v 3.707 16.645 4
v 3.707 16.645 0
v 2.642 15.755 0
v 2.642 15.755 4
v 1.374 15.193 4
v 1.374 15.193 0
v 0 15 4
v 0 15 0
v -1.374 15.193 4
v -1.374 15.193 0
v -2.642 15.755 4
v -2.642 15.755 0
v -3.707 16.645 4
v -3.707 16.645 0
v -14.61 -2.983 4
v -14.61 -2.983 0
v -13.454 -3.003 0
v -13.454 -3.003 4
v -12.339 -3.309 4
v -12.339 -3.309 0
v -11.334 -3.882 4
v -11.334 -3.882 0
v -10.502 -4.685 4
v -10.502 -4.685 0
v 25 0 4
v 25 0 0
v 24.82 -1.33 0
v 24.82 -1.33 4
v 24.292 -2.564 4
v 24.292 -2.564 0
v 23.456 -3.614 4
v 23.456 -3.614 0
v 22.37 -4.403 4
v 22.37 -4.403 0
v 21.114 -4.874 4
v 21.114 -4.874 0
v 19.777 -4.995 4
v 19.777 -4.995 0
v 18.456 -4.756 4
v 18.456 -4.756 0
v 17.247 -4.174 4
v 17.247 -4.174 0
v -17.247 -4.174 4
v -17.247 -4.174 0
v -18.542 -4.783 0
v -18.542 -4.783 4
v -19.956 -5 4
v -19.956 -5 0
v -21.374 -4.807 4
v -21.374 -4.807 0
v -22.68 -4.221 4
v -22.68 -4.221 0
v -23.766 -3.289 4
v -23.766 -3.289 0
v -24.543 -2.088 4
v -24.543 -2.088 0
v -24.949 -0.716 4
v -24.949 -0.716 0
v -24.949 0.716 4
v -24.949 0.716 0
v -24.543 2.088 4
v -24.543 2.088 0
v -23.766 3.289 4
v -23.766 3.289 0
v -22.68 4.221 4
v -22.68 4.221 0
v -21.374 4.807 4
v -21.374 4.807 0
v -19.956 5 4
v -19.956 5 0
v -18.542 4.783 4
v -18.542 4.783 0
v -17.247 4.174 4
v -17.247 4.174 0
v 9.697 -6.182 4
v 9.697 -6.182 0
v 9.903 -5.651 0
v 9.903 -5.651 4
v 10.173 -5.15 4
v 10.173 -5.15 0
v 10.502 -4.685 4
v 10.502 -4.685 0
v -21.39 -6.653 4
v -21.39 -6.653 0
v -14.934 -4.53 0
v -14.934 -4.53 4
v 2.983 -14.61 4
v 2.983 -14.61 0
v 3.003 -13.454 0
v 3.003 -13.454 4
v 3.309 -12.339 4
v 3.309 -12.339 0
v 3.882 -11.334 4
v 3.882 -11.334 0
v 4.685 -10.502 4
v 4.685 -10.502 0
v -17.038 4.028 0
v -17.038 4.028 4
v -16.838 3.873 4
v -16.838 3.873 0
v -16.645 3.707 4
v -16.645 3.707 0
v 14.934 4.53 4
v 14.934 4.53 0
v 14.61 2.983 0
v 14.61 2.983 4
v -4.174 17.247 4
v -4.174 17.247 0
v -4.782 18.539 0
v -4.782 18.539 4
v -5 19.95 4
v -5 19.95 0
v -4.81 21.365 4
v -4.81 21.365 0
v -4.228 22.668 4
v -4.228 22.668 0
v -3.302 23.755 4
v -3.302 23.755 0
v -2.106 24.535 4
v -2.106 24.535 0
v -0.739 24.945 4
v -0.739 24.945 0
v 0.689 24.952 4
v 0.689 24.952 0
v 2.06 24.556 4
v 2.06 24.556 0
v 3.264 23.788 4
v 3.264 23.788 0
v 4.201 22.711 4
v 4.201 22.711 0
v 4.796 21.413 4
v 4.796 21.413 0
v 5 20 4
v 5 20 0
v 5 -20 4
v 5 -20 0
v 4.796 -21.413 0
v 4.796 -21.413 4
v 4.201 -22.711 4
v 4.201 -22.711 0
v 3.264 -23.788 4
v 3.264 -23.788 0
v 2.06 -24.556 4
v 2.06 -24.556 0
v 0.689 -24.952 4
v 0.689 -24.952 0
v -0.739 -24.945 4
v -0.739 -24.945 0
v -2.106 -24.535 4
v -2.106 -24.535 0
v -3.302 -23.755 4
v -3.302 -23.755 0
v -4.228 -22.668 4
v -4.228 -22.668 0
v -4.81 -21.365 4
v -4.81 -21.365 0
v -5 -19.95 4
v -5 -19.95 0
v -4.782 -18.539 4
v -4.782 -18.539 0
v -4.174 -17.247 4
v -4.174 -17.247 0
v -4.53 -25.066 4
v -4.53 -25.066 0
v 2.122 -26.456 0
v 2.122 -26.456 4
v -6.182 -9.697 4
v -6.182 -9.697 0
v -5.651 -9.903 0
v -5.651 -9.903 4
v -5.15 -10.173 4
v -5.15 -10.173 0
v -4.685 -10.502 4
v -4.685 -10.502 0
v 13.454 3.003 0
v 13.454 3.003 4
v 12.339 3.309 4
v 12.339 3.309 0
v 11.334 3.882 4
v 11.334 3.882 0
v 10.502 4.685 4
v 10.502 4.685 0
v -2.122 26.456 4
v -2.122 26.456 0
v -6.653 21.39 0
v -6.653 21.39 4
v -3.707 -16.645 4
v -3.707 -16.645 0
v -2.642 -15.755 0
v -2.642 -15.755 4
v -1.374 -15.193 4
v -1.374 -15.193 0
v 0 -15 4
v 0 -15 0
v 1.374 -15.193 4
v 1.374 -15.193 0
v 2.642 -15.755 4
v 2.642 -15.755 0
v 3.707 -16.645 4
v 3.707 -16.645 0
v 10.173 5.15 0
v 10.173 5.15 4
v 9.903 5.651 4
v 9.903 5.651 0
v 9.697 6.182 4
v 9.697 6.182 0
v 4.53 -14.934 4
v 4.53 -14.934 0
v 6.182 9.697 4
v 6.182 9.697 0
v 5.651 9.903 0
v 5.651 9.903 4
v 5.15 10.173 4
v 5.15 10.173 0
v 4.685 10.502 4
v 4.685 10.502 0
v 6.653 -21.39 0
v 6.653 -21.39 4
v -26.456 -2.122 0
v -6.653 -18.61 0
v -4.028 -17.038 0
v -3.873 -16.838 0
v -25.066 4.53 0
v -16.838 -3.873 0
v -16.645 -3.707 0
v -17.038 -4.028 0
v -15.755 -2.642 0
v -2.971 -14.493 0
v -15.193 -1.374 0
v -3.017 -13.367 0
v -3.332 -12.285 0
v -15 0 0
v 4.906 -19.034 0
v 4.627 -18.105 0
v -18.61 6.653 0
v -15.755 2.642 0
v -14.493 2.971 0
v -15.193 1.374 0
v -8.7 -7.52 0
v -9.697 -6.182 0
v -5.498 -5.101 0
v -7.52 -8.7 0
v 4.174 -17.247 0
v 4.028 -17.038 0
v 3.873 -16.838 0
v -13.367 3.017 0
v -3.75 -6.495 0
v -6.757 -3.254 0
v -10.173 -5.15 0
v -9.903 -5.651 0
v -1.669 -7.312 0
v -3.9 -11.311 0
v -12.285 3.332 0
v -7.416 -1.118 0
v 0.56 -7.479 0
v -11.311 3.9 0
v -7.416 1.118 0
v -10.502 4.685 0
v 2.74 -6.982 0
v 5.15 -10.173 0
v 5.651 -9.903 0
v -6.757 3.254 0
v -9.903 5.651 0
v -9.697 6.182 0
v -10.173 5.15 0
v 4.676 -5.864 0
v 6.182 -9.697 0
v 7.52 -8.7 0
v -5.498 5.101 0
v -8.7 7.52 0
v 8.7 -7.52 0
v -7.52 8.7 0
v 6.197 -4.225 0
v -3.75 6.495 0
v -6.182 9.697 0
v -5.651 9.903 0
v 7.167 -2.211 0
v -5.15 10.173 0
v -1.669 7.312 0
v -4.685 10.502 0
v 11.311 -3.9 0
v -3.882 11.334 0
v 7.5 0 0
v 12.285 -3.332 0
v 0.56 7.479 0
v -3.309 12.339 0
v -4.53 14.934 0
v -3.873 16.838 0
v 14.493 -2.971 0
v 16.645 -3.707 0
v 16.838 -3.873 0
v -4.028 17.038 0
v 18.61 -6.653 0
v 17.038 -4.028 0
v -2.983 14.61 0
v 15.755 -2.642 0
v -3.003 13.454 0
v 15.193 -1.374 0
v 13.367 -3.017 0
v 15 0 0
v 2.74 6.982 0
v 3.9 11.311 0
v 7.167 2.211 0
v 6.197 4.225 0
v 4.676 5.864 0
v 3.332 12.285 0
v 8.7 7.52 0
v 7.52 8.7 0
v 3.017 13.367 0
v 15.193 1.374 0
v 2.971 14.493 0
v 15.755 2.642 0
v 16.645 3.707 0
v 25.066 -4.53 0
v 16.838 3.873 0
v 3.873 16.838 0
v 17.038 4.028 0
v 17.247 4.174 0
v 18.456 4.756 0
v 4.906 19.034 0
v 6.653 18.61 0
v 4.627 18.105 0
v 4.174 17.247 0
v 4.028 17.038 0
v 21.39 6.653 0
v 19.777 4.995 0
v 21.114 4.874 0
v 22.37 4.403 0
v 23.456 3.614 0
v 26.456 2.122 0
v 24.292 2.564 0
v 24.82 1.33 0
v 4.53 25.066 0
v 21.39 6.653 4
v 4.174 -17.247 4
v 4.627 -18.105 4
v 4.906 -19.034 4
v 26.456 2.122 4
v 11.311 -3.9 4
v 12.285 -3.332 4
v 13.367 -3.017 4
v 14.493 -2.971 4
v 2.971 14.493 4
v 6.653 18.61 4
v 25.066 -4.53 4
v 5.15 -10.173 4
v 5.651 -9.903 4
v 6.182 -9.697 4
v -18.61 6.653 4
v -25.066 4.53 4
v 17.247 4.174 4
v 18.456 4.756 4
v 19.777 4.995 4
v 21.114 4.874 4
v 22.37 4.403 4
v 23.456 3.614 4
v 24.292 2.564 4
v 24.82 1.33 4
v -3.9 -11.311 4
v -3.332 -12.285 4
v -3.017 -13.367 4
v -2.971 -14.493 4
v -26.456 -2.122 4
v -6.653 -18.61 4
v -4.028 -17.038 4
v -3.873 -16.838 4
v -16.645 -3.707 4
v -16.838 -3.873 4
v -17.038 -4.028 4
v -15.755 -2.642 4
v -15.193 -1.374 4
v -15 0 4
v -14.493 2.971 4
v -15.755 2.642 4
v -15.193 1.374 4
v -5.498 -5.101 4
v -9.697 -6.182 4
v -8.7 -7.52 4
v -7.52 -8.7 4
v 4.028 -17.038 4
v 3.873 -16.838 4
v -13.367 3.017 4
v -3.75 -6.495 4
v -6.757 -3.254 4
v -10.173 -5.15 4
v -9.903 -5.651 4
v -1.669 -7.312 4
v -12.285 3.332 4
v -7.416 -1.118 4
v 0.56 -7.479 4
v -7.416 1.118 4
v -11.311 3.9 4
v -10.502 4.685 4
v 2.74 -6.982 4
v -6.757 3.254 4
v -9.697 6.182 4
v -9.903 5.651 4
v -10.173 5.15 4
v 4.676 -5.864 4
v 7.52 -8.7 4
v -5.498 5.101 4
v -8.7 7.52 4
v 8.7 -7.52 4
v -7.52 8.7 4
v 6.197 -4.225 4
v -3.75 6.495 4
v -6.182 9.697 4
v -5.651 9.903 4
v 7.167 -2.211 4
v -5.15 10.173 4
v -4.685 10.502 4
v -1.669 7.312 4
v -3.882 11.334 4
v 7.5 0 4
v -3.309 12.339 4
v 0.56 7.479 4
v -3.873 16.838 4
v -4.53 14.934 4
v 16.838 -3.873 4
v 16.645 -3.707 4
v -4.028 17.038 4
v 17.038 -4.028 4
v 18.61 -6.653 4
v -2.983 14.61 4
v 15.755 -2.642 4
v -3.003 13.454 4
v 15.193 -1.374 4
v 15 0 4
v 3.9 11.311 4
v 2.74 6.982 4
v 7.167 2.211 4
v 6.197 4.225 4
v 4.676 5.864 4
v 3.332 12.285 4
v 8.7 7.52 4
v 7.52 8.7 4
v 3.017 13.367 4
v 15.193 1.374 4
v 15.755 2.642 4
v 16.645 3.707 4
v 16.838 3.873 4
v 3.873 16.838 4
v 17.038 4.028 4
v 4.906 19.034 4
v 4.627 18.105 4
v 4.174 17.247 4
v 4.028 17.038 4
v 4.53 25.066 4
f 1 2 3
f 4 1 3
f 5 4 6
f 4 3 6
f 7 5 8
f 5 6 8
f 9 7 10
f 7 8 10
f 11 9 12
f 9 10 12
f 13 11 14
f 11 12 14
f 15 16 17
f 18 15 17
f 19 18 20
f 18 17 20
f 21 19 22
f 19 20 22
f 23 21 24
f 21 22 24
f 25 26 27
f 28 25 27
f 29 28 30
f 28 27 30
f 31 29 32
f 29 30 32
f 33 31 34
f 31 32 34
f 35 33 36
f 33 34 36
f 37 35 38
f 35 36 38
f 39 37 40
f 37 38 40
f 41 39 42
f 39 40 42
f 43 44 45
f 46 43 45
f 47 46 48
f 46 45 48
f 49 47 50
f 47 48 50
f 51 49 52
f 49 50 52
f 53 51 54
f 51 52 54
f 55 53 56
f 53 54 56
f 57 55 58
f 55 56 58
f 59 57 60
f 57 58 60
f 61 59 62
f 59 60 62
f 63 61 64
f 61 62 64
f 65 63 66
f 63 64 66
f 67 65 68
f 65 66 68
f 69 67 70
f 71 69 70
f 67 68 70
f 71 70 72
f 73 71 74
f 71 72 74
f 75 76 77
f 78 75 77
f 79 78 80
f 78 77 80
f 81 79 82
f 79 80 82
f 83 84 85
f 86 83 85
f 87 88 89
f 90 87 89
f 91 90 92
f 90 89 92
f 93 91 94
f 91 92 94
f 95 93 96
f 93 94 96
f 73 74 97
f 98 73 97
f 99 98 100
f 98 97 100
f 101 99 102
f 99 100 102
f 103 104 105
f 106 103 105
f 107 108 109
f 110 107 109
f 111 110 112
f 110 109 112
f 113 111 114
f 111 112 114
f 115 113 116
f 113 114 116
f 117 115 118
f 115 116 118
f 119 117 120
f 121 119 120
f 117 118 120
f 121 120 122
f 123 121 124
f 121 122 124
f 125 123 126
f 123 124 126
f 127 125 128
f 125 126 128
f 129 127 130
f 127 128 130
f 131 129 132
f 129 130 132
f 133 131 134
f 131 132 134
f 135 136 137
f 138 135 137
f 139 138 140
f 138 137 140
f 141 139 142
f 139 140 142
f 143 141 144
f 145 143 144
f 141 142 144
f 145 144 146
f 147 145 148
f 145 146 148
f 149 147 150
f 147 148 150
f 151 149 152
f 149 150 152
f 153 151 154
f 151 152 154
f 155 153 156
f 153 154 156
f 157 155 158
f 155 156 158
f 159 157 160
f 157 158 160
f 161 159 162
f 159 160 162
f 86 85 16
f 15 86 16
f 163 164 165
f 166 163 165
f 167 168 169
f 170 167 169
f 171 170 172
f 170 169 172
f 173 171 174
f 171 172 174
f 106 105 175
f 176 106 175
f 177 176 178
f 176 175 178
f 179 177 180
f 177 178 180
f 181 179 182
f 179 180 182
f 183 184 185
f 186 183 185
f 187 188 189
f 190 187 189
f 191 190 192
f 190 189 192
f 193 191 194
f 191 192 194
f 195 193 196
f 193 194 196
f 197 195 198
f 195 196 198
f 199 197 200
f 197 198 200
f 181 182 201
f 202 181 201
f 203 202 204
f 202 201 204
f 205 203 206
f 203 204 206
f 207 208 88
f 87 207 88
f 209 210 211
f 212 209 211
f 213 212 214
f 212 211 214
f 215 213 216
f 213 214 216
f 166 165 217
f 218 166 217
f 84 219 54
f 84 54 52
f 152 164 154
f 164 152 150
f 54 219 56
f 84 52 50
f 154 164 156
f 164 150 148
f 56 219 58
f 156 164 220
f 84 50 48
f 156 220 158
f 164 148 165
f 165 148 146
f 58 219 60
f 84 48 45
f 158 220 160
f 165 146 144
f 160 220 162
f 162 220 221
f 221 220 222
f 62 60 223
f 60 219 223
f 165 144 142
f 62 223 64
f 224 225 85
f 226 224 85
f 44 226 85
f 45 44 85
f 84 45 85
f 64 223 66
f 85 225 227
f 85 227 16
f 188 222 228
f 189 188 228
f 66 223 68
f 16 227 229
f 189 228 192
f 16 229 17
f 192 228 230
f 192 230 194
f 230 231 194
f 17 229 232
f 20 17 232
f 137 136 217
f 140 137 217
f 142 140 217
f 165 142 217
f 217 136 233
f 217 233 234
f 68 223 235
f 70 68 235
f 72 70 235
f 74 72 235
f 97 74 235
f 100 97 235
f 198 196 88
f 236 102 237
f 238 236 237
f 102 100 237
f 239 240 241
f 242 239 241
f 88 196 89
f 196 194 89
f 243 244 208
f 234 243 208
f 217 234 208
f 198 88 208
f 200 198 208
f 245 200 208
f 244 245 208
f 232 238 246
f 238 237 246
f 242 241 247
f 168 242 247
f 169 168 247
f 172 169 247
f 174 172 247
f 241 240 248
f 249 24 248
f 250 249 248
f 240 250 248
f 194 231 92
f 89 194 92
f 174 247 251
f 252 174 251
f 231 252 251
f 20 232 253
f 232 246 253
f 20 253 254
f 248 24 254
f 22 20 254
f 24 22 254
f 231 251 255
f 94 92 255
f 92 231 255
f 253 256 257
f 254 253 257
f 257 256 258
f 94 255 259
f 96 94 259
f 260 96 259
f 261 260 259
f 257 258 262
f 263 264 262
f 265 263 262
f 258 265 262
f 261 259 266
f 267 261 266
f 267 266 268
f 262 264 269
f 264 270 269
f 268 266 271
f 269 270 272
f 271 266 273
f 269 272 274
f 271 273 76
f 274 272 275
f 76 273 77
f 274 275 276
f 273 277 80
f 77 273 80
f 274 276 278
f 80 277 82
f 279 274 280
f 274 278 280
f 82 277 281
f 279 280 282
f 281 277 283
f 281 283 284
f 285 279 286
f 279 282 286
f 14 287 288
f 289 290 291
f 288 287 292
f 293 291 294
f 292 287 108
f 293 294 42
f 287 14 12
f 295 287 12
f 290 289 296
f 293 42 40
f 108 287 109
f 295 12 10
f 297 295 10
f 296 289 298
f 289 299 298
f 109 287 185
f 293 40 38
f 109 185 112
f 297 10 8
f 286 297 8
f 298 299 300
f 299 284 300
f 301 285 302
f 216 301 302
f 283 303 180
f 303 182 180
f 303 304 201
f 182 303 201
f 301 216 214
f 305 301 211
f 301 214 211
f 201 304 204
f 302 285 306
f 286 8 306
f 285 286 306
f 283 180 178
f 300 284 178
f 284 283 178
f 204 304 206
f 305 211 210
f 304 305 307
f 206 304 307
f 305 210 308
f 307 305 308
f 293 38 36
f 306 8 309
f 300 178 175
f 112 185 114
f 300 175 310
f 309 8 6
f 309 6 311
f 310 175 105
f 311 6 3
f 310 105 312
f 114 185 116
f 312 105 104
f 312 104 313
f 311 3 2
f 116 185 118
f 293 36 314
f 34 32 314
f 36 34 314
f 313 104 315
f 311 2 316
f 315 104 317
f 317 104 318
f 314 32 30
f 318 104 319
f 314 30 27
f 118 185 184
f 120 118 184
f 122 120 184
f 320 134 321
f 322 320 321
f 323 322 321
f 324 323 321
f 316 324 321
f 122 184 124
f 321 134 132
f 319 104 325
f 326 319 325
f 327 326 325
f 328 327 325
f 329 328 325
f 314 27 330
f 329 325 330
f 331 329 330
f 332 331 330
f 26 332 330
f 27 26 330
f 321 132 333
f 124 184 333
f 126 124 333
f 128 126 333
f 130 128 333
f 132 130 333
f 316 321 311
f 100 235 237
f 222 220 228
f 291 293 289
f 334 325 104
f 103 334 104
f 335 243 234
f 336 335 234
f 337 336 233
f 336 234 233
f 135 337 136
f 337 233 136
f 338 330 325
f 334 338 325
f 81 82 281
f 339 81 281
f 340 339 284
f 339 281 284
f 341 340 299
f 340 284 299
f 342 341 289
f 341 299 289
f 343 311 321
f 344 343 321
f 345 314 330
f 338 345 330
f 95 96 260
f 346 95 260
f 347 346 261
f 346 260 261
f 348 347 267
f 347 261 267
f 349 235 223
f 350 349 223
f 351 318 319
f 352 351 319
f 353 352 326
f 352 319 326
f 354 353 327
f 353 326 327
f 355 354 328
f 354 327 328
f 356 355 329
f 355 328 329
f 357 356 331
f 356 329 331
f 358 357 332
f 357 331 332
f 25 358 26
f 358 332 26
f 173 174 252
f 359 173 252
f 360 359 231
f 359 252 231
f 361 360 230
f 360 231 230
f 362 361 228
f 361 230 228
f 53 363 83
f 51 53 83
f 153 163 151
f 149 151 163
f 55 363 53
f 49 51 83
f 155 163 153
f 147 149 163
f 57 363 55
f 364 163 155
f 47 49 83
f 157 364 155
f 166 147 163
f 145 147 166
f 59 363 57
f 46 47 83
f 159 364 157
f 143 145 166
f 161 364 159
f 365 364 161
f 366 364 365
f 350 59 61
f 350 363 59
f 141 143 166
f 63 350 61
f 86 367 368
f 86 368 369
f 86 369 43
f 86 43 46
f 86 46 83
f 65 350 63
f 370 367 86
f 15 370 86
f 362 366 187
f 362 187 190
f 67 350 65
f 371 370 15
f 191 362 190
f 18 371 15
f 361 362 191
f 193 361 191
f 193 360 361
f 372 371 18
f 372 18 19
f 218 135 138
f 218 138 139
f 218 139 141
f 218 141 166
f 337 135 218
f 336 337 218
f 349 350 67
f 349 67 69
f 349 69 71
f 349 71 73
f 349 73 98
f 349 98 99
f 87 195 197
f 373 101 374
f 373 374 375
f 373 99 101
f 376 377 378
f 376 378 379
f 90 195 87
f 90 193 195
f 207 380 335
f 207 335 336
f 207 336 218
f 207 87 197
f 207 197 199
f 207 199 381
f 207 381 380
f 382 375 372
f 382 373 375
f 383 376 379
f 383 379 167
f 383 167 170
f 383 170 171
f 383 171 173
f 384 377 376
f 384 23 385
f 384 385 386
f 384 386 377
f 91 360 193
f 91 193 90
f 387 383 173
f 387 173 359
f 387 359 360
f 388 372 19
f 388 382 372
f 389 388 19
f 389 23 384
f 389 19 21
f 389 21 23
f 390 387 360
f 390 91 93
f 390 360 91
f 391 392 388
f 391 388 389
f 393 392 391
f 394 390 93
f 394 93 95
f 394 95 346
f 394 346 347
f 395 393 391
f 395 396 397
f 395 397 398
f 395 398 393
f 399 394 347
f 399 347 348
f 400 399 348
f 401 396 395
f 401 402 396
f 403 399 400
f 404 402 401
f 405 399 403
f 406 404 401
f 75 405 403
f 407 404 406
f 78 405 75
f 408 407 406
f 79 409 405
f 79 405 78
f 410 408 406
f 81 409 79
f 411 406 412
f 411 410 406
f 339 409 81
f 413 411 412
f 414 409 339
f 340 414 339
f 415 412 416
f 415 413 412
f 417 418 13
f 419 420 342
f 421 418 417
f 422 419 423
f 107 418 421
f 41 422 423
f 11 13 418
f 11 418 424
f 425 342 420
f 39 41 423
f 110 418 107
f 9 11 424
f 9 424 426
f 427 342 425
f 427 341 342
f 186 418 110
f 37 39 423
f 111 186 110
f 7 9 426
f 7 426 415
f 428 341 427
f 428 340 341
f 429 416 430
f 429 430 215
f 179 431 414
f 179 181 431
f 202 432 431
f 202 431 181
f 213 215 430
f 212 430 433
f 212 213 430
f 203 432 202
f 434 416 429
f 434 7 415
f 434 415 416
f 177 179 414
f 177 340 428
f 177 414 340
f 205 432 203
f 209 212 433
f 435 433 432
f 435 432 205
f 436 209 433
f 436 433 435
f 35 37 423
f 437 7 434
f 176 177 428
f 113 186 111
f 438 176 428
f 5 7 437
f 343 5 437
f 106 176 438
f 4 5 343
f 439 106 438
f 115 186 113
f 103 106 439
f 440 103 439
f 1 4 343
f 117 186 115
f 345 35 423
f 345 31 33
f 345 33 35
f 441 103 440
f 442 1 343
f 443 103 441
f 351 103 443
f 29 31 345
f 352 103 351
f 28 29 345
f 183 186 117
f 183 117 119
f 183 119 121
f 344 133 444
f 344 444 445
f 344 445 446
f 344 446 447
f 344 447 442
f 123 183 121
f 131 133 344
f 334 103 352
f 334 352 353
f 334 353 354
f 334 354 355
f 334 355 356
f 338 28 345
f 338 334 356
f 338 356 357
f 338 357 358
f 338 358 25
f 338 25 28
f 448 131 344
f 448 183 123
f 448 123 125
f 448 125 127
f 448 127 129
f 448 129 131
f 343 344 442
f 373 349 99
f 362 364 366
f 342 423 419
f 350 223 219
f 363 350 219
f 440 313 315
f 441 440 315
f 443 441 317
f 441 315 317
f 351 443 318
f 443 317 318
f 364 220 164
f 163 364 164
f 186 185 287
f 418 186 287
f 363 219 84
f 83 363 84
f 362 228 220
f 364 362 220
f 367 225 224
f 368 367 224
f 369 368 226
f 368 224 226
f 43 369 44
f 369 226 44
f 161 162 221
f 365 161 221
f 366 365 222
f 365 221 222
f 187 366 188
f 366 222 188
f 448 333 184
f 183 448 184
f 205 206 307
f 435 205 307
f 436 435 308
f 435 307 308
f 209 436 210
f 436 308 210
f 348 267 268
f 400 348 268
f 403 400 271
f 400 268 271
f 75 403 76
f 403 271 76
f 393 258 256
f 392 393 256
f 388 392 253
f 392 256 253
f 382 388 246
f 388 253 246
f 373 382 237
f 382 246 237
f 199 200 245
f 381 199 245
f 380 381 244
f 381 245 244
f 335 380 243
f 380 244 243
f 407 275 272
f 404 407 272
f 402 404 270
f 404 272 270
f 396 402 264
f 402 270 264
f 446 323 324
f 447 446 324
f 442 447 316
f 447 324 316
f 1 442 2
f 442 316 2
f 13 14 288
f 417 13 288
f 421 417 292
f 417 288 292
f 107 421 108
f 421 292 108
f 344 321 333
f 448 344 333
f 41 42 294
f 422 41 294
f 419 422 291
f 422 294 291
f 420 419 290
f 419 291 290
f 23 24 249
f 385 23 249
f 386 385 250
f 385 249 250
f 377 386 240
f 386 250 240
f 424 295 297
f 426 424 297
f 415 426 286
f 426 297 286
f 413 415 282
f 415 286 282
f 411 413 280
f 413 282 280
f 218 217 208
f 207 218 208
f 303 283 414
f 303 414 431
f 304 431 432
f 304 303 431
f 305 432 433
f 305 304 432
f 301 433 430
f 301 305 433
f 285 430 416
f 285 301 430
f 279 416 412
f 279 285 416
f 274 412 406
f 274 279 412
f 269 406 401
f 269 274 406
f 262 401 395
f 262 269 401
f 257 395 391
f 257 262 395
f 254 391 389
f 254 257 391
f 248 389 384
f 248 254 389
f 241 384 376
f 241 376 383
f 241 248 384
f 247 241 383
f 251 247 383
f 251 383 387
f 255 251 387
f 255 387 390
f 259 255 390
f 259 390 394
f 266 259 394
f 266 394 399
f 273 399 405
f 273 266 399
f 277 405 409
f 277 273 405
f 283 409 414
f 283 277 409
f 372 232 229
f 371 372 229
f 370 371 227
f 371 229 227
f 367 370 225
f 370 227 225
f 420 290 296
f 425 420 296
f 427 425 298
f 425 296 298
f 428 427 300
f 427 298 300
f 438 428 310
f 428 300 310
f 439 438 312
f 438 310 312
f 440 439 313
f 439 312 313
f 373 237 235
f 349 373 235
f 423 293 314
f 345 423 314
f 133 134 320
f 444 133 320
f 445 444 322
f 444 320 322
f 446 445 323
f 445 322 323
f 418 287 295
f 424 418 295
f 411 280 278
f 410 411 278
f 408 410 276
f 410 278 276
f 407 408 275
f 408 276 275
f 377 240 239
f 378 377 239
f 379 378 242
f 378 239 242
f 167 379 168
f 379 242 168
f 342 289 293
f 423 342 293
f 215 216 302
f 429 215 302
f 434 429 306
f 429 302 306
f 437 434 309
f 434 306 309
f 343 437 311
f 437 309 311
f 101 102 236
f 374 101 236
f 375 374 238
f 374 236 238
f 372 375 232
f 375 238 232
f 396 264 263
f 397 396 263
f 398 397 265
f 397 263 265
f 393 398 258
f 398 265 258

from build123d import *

# Parameters (mm, degrees)
F0_R     = 7.5
F1_DEPTH = 4


with BuildPart() as f1:
    # F0 (on Top) → F1 (new body)
    with BuildSketch(Plane.XY):
        with BuildLine():
            ThreePointArc((10.5023390129, 4.6851761182), (10.0305689983, 5.3963431452), (9.6971069971, 6.1819184634))
            ThreePointArc((9.6971069971, 6.1819184634), (8.1317279836, 8.1317279836), (6.1819184634, 9.6971069971))
            ThreePointArc((6.1819184634, 9.6971069971), (5.3963431452, 10.0305689983), (4.6851761182, 10.5023390129))
            ThreePointArc((4.6851761182, 10.5023390129), (0, 11.5), (-4.6851761182, 10.5023390129))
            ThreePointArc((-4.6851761182, 10.5023390129), (-5.3963431452, 10.0305689983), (-6.1819184634, 9.6971069971))
            ThreePointArc((-6.1819184634, 9.6971069971), (-8.1317279836, 8.1317279836), (-9.6971069971, 6.1819184634))
            ThreePointArc((-9.6971069971, 6.1819184634), (-10.0305689983, 5.3963431452), (-10.5023390129, 4.6851761182))
            ThreePointArc((-10.5023390129, 4.6851761182), (-11.5, 0), (-10.5023390129, -4.6851761182))
            ThreePointArc((-10.5023390129, -4.6851761182), (-10.0305689983, -5.3963431452), (-9.6971069971, -6.1819184634))
            ThreePointArc((-9.6971069971, -6.1819184634), (-8.1317279836, -8.1317279836), (-6.1819184634, -9.6971069971))
            ThreePointArc((-6.1819184634, -9.6971069971), (-5.3963431452, -10.0305689983), (-4.6851761182, -10.5023390129))
            ThreePointArc((-4.6851761182, -10.5023390129), (0, -11.5), (4.6851761182, -10.5023390129))
            ThreePointArc((4.6851761182, -10.5023390129), (5.3963431452, -10.0305689983), (6.1819184634, -9.6971069971))
            ThreePointArc((6.1819184634, -9.6971069971), (8.1317279836, -8.1317279836), (9.6971069971, -6.1819184634))
            ThreePointArc((9.6971069971, -6.1819184634), (10.0305689983, -5.3963431452), (10.5023390129, -4.6851761182))
            ThreePointArc((10.5023390129, -4.6851761182), (11.2478197587, -2.3951097419), (11.5, 0))
            ThreePointArc((11.5, 0), (11.2478197587, 2.3951097419), (10.5023390129, 4.6851761182))
        make_face()
        Circle(F0_R, mode=Mode.SUBTRACT)
        with BuildLine():
            ThreePointArc((14.6103055623, 2.982595382), (12.338941223, 3.3093913031), (10.5023390129, 4.6851761182))
            ThreePointArc((10.5023390129, 4.6851761182), (11.2478197587, 2.3951097419), (11.5, 0))
            ThreePointArc((11.5, 0), (11.2478197587, -2.3951097419), (10.5023390129, -4.6851761182))
            ThreePointArc((10.5023390129, -4.6851761182), (12.2847026286, -3.3322754018), (14.4930952607, -2.9714951504))
            ThreePointArc((14.4930952607, -2.9714951504), (15.6148030882, -3.2054073782), (16.6449174053, -3.7072119959))
            ThreePointArc((16.6449174053, -3.7072119959), (15, 0), (16.6449174053, 3.7072119959))
            ThreePointArc((16.6449174053, 3.7072119959), (15.6703838257, 3.2248055408), (14.6103055623, 2.982595382))
        make_face()
        with BuildLine():
            ThreePointArc((-4.6851761182, 10.5023390129), (0, 11.5), (4.6851761182, 10.5023390129))
            ThreePointArc((4.6851761182, 10.5023390129), (3.3322754018, 12.2847026286), (2.9714951504, 14.4930952607))
            ThreePointArc((2.9714951504, 14.4930952607), (3.2054073782, 15.6148030882), (3.7072119959, 16.6449174053))
            ThreePointArc((3.7072119959, 16.6449174053), (0, 15), (-3.7072119959, 16.6449174053))
            ThreePointArc((-3.7072119959, 16.6449174053), (-3.2248055408, 15.6703838257), (-2.982595382, 14.6103055623))
            ThreePointArc((-2.982595382, 14.6103055623), (-3.3093913031, 12.338941223), (-4.6851761182, 10.5023390129))
        make_face()
        with BuildLine():
            Line((14.9337128596, 4.5302571293), (14.6103055623, 2.982595382))
            ThreePointArc((14.6103055623, 2.982595382), (15.6703838257, 3.2248055408), (16.6449174053, 3.7072119959))
            ThreePointArc((16.6449174053, 3.7072119959), (16.936960195, 3.9519346089), (17.2467904427, 4.17370784))
            ThreePointArc((17.2467904427, 4.17370784), (22.3700160562, 4.4026155741), (25, 0))
            ThreePointArc((25, 0), (22.3700160562, -4.4026155741), (17.2467904427, -4.17370784))
            ThreePointArc((17.2467904427, -4.17370784), (16.936960195, -3.9519346089), (16.6449174053, -3.7072119959))
            ThreePointArc((16.6449174053, -3.7072119959), (15.6148030882, -3.2054073782), (14.4930952607, -2.9714951504))
            Line((14.4930952607, -2.9714951504), (18.6098258106, -6.6526619311))
            Line((18.6098258106, -6.6526619311), (25.0662871404, -4.5302571293))
            Line((25.0662871404, -4.5302571293), (26.4564613299, 2.1224048018))
            Line((26.4564613299, 2.1224048018), (21.3901741894, 6.6526619311))
            Line((21.3901741894, 6.6526619311), (14.9337128596, 4.5302571293))
        make_face()
        with BuildLine():
            ThreePointArc((3.7072119959, 16.6449174053), (3.2054073782, 15.6148030882), (2.9714951504, 14.4930952607))
            Line((2.9714951504, 14.4930952607), (6.6526619311, 18.6098258106))
            Line((6.6526619311, 18.6098258106), (4.5302571293, 25.0662871404))
            Line((4.5302571293, 25.0662871404), (-2.1224048018, 26.4564613299))
            Line((-2.1224048018, 26.4564613299), (-6.6526619311, 21.3901741894))
            Line((-6.6526619311, 21.3901741894), (-4.5302571293, 14.9337128596))
            Line((-4.5302571293, 14.9337128596), (-2.982595382, 14.6103055623))
            ThreePointArc((-2.982595382, 14.6103055623), (-3.2248055408, 15.6703838257), (-3.7072119959, 16.6449174053))
            ThreePointArc((-3.7072119959, 16.6449174053), (-3.9519346089, 16.936960195), (-4.17370784, 17.2467904427))
            ThreePointArc((-4.17370784, 17.2467904427), (-1.4372649025, 24.7889737523), (5, 20))
            ThreePointArc((5, 20), (4.7889737523, 18.5627350975), (4.17370784, 17.2467904427))
            ThreePointArc((4.17370784, 17.2467904427), (3.9519346089, 16.936960195), (3.7072119959, 16.6449174053))
        make_face()
        with BuildLine():
            ThreePointArc((-10.5023390129, -4.6851761182), (-11.5, 0), (-10.5023390129, 4.6851761182))
            ThreePointArc((-10.5023390129, 4.6851761182), (-12.2847026286, 3.3322754018), (-14.4930952607, 2.9714951504))
            ThreePointArc((-14.4930952607, 2.9714951504), (-15.6148030882, 3.2054073782), (-16.6449174053, 3.7072119959))
            ThreePointArc((-16.6449174053, 3.7072119959), (-15.4296929549, 2.0278790677), (-15, 0))
            ThreePointArc((-15, 0), (-15.4296929549, -2.0278790677), (-16.6449174053, -3.7072119959))
            ThreePointArc((-16.6449174053, -3.7072119959), (-15.6703838257, -3.2248055408), (-14.6103055623, -2.982595382))
            ThreePointArc((-14.6103055623, -2.982595382), (-12.338941223, -3.3093913031), (-10.5023390129, -4.6851761182))
        make_face()
        with BuildLine():
            ThreePointArc((2.982595382, -14.6103055623), (3.3093913031, -12.338941223), (4.6851761182, -10.5023390129))
            ThreePointArc((4.6851761182, -10.5023390129), (0, -11.5), (-4.6851761182, -10.5023390129))
            ThreePointArc((-4.6851761182, -10.5023390129), (-3.3322754018, -12.2847026286), (-2.9714951504, -14.4930952607))
            ThreePointArc((-2.9714951504, -14.4930952607), (-3.2054073782, -15.6148030882), (-3.7072119959, -16.6449174053))
            ThreePointArc((-3.7072119959, -16.6449174053), (0, -15), (3.7072119959, -16.6449174053))
            ThreePointArc((3.7072119959, -16.6449174053), (3.2248055408, -15.6703838257), (2.982595382, -14.6103055623))
        make_face()
        with BuildLine():
            ThreePointArc((-16.6449174053, 3.7072119959), (-15.6148030882, 3.2054073782), (-14.4930952607, 2.9714951504))
            Line((-14.4930952607, 2.9714951504), (-18.6098258106, 6.6526619311))
            Line((-18.6098258106, 6.6526619311), (-25.0662871404, 4.5302571293))
            Line((-25.0662871404, 4.5302571293), (-26.4564613299, -2.1224048018))
            Line((-26.4564613299, -2.1224048018), (-21.3901741894, -6.6526619311))
            Line((-21.3901741894, -6.6526619311), (-14.9337128596, -4.5302571293))
            Line((-14.9337128596, -4.5302571293), (-14.6103055623, -2.982595382))
            ThreePointArc((-14.6103055623, -2.982595382), (-15.6703838257, -3.2248055408), (-16.6449174053, -3.7072119959))
            ThreePointArc((-16.6449174053, -3.7072119959), (-16.936960195, -3.9519346089), (-17.2467904427, -4.17370784))
            ThreePointArc((-17.2467904427, -4.17370784), (-25, 0), (-17.2467904427, 4.17370784))
            ThreePointArc((-17.2467904427, 4.17370784), (-16.936960195, 3.9519346089), (-16.6449174053, 3.7072119959))
        make_face()
        with BuildLine():
            Line((4.5302571293, -14.9337128596), (2.982595382, -14.6103055623))
            ThreePointArc((2.982595382, -14.6103055623), (3.2248055408, -15.6703838257), (3.7072119959, -16.6449174053))
            ThreePointArc((3.7072119959, -16.6449174053), (3.9519346089, -16.936960195), (4.17370784, -17.2467904427))
            ThreePointArc((4.17370784, -17.2467904427), (4.7889737523, -18.5627350975), (5, -20))
            ThreePointArc((5, -20), (-1.4372649025, -24.7889737523), (-4.17370784, -17.2467904427))
            ThreePointArc((-4.17370784, -17.2467904427), (-3.9519346089, -16.936960195), (-3.7072119959, -16.6449174053))
            ThreePointArc((-3.7072119959, -16.6449174053), (-3.2054073782, -15.6148030882), (-2.9714951504, -14.4930952607))
            Line((-2.9714951504, -14.4930952607), (-6.6526619311, -18.6098258106))
            Line((-6.6526619311, -18.6098258106), (-4.5302571293, -25.0662871404))
            Line((-4.5302571293, -25.0662871404), (2.1224048018, -26.4564613299))
            Line((2.1224048018, -26.4564613299), (6.6526619311, -21.3901741894))
            Line((6.6526619311, -21.3901741894), (4.5302571293, -14.9337128596))
        make_face()
    extrude(amount=F1_DEPTH)


solid = f1.part
